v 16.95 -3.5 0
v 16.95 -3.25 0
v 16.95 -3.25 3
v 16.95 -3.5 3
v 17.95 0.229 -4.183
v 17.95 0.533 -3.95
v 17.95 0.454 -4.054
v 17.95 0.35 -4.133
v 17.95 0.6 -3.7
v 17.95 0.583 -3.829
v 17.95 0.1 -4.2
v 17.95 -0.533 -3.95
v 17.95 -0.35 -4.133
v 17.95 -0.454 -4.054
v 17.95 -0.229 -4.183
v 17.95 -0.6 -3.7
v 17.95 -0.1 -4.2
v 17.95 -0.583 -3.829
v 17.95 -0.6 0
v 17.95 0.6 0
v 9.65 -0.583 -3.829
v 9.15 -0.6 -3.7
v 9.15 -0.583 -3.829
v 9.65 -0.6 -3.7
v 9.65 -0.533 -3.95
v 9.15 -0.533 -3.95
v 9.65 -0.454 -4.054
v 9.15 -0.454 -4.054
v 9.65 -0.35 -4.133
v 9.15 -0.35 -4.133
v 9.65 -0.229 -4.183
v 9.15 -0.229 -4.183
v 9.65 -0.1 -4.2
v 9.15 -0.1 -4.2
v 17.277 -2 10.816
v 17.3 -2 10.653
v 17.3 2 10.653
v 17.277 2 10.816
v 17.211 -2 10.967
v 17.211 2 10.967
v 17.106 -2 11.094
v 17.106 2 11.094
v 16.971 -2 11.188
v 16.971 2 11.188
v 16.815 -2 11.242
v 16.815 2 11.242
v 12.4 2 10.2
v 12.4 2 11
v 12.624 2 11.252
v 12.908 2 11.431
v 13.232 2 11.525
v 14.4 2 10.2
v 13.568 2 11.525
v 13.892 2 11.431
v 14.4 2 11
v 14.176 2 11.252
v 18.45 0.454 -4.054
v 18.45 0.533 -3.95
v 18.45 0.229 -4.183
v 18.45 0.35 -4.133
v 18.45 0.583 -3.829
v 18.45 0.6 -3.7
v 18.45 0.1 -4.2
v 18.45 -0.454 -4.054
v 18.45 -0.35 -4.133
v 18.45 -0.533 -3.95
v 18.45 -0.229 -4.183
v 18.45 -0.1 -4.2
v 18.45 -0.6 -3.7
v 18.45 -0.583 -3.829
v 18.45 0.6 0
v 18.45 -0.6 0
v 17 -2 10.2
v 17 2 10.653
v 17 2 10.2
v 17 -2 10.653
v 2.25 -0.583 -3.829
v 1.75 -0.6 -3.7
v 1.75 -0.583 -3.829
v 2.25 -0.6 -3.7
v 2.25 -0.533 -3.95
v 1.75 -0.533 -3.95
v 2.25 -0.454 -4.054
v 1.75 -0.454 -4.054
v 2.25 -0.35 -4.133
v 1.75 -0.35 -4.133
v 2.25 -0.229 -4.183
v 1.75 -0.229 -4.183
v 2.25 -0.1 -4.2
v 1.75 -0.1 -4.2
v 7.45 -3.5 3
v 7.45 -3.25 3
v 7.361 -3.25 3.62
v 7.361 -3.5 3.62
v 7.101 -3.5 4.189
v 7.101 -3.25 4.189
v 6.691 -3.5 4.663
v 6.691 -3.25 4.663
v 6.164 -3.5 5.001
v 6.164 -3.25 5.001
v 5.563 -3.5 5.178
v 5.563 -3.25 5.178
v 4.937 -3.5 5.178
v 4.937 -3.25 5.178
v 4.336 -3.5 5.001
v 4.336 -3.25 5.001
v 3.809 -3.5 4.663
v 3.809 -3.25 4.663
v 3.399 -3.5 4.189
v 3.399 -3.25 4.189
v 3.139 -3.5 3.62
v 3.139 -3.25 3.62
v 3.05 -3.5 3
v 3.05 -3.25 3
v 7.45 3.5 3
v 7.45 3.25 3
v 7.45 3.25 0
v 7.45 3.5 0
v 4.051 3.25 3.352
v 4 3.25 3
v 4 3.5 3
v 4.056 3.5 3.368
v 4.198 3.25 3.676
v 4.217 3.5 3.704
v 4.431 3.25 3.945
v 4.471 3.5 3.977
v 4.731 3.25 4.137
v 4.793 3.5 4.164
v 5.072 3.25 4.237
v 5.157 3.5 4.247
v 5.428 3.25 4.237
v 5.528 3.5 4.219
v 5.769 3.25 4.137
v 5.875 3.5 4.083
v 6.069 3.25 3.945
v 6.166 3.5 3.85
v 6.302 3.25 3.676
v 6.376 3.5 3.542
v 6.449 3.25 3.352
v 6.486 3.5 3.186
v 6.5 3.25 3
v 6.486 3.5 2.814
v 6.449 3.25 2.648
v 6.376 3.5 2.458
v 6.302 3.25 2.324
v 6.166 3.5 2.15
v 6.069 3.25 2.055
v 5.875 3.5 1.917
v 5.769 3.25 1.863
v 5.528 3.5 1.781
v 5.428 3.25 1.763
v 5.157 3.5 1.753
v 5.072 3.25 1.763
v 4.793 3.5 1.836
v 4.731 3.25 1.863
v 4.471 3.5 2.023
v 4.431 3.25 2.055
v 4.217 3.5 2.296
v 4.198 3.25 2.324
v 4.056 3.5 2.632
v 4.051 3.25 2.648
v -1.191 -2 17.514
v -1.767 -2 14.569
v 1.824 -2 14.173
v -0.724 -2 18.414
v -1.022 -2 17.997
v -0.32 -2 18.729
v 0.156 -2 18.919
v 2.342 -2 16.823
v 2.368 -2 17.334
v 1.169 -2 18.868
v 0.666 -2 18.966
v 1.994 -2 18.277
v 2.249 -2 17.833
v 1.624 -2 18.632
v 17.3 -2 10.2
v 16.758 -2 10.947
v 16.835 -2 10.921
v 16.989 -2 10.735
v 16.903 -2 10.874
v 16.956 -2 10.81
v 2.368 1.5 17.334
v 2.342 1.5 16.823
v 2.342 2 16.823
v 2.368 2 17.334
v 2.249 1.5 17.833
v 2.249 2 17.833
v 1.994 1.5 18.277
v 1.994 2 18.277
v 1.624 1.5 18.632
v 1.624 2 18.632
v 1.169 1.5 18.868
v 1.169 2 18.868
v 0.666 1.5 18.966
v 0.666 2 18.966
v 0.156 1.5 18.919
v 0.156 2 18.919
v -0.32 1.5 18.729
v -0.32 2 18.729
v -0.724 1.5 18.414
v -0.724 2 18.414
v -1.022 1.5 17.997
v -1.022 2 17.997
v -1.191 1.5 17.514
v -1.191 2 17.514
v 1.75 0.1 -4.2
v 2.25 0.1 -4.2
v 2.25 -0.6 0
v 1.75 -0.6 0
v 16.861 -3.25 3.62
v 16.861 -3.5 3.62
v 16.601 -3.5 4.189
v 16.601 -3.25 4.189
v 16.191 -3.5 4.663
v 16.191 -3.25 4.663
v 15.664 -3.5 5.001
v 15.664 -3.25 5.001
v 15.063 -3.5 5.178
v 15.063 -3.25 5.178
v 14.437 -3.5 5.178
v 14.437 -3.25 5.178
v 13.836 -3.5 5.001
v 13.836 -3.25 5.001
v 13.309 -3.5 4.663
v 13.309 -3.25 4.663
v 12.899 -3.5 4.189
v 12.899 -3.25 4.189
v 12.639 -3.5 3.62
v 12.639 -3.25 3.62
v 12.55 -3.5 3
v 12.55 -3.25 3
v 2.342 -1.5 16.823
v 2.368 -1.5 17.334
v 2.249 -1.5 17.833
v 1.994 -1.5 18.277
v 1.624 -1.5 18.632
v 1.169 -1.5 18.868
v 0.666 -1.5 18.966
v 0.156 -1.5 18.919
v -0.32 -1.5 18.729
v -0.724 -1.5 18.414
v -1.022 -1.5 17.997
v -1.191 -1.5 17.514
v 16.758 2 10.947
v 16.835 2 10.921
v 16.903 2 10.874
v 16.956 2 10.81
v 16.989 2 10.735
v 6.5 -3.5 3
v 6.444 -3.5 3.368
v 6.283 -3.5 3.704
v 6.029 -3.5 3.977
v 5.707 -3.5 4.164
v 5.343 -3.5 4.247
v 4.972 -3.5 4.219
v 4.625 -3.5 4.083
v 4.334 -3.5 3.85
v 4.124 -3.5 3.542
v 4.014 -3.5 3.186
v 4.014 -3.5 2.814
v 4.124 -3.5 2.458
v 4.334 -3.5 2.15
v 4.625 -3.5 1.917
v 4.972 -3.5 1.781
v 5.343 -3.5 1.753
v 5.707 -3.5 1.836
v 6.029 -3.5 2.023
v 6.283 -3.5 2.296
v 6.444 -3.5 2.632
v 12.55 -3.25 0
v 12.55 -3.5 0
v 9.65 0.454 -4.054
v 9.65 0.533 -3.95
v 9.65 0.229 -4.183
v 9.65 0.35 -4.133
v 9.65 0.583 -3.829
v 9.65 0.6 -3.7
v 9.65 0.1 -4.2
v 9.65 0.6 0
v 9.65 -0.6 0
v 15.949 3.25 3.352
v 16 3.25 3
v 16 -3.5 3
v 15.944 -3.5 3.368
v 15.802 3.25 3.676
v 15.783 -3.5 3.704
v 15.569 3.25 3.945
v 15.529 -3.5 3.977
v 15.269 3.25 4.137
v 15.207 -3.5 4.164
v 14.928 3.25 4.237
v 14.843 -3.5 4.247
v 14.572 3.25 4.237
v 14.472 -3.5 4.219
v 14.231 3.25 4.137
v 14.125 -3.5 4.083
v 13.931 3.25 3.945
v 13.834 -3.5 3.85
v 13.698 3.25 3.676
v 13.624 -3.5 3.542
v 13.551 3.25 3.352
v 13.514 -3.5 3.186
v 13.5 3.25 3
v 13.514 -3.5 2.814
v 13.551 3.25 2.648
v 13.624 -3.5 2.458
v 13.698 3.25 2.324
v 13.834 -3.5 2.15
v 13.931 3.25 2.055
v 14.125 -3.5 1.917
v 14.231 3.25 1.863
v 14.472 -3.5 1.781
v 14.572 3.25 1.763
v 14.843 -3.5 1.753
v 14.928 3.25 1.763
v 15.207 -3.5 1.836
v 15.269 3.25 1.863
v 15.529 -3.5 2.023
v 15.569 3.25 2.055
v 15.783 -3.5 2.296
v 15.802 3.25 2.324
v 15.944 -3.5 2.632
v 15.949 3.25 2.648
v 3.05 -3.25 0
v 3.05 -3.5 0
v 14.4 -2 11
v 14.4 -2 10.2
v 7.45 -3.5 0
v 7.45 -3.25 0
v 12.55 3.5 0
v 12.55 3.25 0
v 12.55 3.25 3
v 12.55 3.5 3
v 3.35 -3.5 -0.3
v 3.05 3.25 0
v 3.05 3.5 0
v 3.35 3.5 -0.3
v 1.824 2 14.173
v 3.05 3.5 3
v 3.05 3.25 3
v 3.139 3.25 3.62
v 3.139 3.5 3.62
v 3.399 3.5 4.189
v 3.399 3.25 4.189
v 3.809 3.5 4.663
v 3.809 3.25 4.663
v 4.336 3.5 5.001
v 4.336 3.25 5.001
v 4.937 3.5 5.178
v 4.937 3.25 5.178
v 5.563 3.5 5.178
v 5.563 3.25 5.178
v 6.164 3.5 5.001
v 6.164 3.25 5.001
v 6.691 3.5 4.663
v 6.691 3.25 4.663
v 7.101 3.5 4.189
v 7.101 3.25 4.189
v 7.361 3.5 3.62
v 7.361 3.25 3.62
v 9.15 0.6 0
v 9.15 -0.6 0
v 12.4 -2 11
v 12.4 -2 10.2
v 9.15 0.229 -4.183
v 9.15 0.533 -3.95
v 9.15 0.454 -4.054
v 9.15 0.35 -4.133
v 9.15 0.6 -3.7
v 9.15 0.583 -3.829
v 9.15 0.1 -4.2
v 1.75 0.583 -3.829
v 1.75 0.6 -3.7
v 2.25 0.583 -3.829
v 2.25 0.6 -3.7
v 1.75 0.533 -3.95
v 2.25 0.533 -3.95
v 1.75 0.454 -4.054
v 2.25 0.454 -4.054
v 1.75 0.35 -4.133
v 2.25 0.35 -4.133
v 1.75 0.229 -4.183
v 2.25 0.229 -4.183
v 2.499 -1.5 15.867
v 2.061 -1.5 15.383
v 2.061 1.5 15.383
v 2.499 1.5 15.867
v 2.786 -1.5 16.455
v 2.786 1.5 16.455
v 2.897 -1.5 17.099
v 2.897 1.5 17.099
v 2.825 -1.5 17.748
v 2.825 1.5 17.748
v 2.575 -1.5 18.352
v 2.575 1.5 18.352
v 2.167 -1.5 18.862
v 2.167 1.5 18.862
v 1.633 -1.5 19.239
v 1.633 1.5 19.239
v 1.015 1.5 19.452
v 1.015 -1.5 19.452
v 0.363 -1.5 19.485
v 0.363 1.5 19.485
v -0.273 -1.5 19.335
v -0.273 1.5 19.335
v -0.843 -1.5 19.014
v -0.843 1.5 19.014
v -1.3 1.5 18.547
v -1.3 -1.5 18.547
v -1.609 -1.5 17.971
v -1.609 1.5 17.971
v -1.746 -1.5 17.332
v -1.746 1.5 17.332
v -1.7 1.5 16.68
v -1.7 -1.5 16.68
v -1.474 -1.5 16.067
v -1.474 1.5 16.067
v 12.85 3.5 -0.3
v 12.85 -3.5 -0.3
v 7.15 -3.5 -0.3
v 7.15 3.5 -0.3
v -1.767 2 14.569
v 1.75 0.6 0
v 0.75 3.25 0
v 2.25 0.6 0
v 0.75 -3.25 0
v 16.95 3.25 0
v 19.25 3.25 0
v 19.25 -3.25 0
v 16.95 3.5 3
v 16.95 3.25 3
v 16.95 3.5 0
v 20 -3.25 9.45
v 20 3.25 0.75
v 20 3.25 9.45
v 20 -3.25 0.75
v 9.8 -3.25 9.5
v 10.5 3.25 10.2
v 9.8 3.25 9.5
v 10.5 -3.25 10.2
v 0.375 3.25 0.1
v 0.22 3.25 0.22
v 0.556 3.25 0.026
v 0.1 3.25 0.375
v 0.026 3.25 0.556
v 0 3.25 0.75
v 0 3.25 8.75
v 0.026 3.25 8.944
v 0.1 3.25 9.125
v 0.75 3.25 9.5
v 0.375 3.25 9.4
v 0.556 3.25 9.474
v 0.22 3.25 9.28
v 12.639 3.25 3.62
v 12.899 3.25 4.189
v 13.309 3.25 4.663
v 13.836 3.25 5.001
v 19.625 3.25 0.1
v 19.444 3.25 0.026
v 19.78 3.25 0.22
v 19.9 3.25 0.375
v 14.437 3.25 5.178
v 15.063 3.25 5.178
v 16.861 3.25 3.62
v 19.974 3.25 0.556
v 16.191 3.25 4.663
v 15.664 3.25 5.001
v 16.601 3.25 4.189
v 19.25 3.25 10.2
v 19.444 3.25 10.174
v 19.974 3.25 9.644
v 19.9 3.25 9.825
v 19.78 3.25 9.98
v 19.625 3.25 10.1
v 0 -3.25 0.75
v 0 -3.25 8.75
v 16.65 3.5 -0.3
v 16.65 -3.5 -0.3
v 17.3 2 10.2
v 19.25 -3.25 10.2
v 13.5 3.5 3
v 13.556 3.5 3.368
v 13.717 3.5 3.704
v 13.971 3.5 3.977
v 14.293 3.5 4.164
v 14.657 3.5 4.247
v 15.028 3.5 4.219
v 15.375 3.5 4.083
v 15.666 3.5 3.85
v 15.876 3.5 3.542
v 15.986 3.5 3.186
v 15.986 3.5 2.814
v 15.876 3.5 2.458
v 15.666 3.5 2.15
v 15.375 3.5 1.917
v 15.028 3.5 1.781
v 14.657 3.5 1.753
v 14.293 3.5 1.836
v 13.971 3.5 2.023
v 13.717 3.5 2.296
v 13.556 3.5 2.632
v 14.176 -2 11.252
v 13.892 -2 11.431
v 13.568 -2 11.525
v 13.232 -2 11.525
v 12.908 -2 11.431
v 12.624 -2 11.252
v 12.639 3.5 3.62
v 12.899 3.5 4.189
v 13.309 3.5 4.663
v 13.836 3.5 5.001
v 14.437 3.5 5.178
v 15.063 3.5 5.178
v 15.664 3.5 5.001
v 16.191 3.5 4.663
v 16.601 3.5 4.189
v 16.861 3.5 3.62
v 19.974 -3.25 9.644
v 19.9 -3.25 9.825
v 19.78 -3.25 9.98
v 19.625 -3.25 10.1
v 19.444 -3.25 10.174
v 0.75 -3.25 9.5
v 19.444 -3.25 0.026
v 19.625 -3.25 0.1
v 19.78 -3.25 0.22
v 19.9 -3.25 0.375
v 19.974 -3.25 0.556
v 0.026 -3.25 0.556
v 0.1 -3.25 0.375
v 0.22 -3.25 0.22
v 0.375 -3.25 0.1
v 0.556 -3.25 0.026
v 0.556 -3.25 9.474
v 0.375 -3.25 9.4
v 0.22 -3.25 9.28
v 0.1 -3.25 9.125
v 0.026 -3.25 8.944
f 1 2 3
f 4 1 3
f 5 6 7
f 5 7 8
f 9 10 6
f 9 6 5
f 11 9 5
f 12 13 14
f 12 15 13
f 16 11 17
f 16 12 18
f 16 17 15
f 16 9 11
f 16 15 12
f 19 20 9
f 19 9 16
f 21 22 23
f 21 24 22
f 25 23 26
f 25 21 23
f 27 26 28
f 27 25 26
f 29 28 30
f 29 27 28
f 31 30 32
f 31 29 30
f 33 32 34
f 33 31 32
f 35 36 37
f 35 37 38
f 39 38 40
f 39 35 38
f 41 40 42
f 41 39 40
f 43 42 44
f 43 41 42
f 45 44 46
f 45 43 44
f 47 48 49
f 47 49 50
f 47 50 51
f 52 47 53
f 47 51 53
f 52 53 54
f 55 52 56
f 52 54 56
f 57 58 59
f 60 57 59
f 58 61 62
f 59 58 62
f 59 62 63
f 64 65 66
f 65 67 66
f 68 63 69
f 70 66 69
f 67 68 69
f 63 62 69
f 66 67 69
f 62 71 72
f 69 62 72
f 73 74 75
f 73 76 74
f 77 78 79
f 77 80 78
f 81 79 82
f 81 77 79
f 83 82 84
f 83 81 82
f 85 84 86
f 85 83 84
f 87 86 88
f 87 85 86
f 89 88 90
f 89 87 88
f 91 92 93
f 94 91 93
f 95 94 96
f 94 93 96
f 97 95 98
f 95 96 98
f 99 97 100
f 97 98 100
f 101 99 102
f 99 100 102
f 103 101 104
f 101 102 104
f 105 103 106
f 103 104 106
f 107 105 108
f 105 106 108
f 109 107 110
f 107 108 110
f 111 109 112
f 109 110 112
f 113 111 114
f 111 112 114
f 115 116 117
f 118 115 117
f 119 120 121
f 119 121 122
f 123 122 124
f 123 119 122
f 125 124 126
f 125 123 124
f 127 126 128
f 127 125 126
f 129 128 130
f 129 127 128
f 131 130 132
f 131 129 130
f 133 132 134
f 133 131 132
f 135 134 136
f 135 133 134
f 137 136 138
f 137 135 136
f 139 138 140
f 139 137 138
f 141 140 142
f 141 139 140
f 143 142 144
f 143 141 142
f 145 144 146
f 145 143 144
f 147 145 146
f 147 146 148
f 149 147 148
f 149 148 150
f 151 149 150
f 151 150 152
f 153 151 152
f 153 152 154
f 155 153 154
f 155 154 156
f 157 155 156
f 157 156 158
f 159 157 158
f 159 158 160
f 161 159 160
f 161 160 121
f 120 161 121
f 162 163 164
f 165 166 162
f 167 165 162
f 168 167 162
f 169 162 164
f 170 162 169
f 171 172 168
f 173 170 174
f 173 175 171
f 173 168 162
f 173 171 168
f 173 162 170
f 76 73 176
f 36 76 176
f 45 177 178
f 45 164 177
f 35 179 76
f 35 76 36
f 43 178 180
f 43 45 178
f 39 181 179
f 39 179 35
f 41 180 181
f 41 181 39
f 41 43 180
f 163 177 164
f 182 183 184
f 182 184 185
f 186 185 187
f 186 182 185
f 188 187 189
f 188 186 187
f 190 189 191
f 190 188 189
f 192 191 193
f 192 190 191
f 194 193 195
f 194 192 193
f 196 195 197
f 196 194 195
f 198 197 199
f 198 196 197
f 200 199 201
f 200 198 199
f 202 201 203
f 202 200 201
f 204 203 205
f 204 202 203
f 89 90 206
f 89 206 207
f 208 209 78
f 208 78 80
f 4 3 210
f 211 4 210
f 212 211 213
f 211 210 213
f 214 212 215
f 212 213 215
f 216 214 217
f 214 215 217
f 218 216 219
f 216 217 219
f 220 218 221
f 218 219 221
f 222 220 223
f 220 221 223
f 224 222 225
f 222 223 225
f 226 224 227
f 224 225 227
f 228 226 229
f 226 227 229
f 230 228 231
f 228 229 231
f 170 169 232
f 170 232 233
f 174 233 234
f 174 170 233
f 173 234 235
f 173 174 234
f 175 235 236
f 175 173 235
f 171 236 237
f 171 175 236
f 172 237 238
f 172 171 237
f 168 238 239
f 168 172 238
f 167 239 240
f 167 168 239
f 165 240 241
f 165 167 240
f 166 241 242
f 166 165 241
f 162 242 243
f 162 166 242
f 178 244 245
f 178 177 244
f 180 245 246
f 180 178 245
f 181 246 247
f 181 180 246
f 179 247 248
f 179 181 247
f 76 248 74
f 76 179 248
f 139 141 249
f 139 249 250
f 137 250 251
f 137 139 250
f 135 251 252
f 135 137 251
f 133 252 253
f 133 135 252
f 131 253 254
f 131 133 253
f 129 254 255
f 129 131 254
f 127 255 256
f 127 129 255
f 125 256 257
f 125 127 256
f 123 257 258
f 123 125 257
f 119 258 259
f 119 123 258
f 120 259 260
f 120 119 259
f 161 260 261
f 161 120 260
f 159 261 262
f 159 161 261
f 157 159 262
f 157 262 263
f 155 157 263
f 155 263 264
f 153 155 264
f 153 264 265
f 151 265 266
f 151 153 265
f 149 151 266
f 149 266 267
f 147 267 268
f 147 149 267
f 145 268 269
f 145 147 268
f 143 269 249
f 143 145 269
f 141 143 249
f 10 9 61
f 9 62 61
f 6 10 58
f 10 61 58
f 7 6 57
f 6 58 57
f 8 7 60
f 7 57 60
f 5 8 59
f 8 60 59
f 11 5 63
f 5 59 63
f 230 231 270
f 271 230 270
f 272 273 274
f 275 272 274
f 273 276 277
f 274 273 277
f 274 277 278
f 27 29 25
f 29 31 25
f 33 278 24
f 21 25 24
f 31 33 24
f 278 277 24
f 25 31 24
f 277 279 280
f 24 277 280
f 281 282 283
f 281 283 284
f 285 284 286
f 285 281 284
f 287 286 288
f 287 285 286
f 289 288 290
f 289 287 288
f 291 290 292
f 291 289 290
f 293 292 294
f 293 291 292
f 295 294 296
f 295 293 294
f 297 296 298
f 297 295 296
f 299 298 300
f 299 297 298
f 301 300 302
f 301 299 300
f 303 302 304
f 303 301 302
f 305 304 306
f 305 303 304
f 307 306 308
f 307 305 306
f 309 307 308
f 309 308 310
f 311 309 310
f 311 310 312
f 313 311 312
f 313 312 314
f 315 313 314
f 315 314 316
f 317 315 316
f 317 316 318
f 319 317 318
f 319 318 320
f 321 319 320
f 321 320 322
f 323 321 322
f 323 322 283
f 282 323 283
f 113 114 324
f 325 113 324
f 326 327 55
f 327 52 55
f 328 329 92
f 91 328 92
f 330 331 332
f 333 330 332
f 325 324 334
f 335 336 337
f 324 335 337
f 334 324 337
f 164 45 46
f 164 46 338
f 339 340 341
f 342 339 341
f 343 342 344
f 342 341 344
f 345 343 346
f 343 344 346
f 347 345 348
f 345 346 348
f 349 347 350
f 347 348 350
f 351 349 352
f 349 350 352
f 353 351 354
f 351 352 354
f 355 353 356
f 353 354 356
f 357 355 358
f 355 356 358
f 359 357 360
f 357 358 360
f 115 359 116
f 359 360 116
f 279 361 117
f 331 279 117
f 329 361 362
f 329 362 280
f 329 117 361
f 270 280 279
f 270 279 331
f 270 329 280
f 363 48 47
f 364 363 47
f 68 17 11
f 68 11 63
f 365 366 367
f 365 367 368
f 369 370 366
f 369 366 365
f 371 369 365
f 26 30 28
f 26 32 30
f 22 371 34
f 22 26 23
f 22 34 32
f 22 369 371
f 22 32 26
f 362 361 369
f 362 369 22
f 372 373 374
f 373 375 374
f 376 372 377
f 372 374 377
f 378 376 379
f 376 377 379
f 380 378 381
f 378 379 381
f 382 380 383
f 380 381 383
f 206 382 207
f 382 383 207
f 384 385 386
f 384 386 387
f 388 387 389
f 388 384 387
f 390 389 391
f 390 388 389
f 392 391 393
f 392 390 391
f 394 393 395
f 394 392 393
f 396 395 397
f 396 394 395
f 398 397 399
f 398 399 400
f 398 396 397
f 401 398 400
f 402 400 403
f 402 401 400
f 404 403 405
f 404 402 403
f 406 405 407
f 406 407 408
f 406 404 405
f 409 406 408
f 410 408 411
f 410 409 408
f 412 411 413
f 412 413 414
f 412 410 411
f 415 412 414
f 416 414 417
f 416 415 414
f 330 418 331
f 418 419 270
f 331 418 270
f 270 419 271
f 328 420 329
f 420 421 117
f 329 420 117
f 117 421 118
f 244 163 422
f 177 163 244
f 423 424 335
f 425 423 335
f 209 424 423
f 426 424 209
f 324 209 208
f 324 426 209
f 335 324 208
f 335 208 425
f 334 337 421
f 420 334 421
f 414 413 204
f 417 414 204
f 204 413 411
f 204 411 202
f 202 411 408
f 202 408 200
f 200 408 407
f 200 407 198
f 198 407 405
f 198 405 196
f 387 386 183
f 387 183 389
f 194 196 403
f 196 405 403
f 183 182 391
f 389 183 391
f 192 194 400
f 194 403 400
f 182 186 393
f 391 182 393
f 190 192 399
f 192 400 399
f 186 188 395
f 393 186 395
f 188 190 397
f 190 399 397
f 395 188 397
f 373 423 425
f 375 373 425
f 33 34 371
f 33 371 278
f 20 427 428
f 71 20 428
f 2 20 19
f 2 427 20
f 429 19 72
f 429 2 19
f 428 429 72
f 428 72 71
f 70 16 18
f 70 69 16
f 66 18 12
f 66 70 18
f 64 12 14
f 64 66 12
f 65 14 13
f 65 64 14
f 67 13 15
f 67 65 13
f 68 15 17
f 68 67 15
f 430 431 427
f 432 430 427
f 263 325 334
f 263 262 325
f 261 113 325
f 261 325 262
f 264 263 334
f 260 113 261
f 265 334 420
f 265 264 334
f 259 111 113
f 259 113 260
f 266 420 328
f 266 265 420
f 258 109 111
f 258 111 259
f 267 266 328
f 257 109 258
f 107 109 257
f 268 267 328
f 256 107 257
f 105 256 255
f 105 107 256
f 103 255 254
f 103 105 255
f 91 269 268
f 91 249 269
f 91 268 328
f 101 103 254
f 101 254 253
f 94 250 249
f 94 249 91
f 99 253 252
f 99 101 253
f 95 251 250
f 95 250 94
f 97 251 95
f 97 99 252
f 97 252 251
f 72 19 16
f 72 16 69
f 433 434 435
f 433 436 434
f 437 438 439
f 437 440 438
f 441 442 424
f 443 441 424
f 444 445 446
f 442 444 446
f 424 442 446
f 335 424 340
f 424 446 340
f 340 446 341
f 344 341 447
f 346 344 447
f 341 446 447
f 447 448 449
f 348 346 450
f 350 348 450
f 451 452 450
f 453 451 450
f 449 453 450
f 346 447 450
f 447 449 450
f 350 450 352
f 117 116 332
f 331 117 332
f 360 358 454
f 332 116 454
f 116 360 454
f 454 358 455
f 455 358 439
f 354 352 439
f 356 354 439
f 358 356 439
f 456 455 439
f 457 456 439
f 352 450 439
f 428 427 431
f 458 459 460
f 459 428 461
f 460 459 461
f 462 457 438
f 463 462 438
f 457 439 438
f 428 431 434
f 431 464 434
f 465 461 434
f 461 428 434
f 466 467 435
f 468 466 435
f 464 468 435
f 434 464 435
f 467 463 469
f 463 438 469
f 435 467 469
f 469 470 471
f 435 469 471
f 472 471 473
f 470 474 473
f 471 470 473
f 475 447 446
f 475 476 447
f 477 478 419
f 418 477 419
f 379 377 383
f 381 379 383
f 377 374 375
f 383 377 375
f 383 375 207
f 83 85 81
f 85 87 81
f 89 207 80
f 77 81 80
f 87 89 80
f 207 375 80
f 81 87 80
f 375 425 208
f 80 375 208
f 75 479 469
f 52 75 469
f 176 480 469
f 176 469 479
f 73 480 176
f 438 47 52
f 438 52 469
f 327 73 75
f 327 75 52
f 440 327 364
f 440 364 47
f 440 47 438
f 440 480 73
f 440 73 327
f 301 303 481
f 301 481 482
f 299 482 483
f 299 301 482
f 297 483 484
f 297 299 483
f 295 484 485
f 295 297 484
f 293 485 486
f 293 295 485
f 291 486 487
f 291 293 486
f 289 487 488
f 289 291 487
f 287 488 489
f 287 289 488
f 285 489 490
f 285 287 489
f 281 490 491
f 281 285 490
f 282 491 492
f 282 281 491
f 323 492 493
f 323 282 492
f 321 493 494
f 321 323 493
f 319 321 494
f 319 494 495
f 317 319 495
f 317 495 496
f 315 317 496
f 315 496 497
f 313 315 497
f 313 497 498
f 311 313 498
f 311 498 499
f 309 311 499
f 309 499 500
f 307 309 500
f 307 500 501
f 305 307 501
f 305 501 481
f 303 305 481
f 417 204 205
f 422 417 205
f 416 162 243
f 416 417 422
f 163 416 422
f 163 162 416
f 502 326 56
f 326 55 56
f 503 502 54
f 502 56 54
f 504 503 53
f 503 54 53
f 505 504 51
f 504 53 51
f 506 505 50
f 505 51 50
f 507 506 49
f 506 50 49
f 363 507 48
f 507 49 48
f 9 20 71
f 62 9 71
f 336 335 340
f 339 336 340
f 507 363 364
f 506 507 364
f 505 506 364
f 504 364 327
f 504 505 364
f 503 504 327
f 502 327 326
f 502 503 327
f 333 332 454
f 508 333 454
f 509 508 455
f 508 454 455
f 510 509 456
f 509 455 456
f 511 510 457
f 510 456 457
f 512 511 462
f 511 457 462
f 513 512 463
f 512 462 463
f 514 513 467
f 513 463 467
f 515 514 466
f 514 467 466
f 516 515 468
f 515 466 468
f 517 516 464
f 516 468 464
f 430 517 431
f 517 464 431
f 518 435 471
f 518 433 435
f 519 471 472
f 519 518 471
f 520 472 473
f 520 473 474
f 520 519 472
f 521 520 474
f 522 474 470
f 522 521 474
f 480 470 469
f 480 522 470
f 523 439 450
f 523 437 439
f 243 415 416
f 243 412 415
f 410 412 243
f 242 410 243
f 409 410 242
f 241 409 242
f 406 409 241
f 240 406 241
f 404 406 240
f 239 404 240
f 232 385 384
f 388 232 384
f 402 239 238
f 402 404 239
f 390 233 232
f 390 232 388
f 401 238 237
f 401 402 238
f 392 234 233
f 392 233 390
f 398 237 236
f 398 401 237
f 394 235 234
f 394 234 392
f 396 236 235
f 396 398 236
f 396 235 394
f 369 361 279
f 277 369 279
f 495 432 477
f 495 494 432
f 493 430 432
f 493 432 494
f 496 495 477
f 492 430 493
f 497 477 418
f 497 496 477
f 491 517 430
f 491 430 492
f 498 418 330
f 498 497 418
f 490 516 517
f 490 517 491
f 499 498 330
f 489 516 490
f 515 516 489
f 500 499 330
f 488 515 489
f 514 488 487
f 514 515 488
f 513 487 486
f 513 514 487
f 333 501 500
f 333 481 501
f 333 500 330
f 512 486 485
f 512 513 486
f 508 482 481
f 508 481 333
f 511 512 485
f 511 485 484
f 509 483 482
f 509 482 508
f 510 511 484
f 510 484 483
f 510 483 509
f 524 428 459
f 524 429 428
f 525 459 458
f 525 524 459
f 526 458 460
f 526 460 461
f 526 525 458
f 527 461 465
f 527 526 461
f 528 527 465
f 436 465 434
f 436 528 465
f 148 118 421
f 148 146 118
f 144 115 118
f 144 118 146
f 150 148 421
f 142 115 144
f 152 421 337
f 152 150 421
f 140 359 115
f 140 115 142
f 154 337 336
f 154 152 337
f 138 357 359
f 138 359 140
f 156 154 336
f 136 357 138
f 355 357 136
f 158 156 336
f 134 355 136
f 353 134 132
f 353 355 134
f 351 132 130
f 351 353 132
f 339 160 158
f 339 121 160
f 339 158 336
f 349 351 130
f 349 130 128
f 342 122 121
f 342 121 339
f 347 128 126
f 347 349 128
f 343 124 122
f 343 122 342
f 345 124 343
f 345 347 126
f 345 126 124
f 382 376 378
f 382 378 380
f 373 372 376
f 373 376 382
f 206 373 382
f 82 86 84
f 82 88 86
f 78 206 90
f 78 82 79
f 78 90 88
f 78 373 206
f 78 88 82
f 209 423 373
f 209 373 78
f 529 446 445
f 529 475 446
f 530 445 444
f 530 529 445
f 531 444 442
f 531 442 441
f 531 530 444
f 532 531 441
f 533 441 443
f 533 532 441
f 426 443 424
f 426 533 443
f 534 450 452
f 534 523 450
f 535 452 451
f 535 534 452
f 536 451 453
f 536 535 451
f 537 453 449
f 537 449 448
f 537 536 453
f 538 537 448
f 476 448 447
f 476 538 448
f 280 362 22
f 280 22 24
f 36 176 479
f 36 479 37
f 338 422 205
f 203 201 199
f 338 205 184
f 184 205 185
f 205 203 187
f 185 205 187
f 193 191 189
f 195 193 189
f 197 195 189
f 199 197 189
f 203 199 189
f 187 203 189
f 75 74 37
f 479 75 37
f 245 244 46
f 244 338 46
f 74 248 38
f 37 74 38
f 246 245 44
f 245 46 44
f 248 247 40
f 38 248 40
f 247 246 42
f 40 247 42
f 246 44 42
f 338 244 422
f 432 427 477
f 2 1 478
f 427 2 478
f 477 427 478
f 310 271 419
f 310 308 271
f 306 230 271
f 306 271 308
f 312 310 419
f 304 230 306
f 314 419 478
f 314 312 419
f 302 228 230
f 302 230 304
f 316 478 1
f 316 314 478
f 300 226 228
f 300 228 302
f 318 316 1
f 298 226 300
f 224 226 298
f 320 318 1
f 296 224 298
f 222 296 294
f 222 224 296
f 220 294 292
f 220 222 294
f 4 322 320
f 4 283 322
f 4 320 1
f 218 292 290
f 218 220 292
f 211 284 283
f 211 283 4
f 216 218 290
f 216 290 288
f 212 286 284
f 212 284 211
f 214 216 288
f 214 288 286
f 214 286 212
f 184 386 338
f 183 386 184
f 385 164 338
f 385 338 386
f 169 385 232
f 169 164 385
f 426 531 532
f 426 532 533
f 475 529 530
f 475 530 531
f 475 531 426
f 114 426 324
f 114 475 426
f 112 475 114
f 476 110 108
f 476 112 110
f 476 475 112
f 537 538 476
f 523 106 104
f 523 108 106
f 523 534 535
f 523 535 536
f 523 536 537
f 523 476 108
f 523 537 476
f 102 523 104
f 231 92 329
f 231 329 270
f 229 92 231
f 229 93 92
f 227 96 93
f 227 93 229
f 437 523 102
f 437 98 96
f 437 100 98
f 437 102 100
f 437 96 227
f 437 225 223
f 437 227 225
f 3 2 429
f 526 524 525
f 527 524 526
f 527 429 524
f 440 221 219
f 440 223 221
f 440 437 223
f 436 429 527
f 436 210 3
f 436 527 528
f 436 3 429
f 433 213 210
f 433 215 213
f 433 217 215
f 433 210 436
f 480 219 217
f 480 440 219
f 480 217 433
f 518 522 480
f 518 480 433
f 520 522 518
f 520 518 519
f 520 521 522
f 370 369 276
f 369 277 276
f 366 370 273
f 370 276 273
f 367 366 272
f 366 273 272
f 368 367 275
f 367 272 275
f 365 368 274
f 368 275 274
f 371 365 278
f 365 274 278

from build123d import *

# Parameters (mm, degrees)
F0_R      = 1.25
F1_DEPTH  = 3.25
F2_R      = 1.25
F3_DEPTH  = 0.25
F4_R      = 1.25
F5_DEPTH  = 0.25
F6_R      = 0.75
F7_DEPTH  = 2
F8_W      = 3.4
F8_H      = 6
F9_DEPTH  = 25
F10_R     = 0.75
F11_DEPTH = 4
F12_W     = 0.5
F12_H     = 1.2
F13_DEPTH = 4.2
F14_R     = 0.5
F15_R     = 2.325
F15_R_2   = 0.8
F16_DEPTH = 1.5


with BuildPart() as f1:
    # F0 (on Front) → F1 (new body, symmetric)
    with BuildSketch(Plane.XZ):
        with BuildLine():
            ThreePointArc((0, 0.75), (0.2196699141, 0.2196699141), (0.75, 0))
            Line((0.75, 0), (3.05, 0))
            Line((3.05, 0), (3.35, -0.3))
            Line((3.35, -0.3), (7.15, -0.3))
            Line((7.15, -0.3), (7.45, 0))
            Line((7.45, 0), (12.55, 0))
            Line((12.55, 0), (12.85, -0.3))
            Line((12.85, -0.3), (16.65, -0.3))
            Line((16.65, -0.3), (16.95, 0))
            Line((16.95, 0), (19.25, 0))
            ThreePointArc((19.25, 0), (19.7803300859, 0.2196699141), (20, 0.75))
            Line((20, 0.75), (20, 9.45))
            ThreePointArc((20, 9.45), (19.7803300859, 9.9803300859), (19.25, 10.2))
            Line((19.25, 10.2), (10.5, 10.2))
            Line((10.5, 10.2), (9.8, 9.5))
            Line((9.8, 9.5), (0.75, 9.5))
            ThreePointArc((0.75, 9.5), (0.2196699141, 9.2803300859), (0, 8.75))
            Line((0, 8.75), (0, 0.75))
        make_face()
        with Locations((5.25, 3)):
            Circle(F0_R, mode=Mode.SUBTRACT)
        with Locations((14.75, 3)):
            Circle(F0_R, mode=Mode.SUBTRACT)
    extrude(amount=F1_DEPTH, both=True)

    # F2 (on face) → F3 (join)
    with BuildSketch(Plane.XZ.offset(3.25)):
        with BuildLine():
            Line((7.45, 0), (7.45, 3))
            ThreePointArc((7.45, 3), (5.25, 5.2), (3.05, 3))
            Line((3.05, 3), (3.05, 0))
            Line((3.05, 0), (3.35, -0.3))
            Line((3.35, -0.3), (7.15, -0.3))
            Line((7.15, -0.3), (7.45, 0))
        make_face()
        with Locations((5.25, 3)):
            Circle(F2_R, mode=Mode.SUBTRACT)
        with BuildLine():
            Line((16.95, 0), (16.95, 3))
            ThreePointArc((16.95, 3), (14.75, 5.2), (12.55, 3))
            Line((12.55, 3), (12.55, 0))
            Line((12.55, 0), (12.85, -0.3))
            Line((12.85, -0.3), (16.65, -0.3))
            Line((16.65, -0.3), (16.95, 0))
        make_face()
        with Locations((14.75, 3)):
            Circle(F2_R, mode=Mode.SUBTRACT)
    extrude(amount=F3_DEPTH)

    # F4 (on face) → F5 (join)
    with BuildSketch(Plane(origin=(0, 3.25, 0), x_dir=(-1, 0, 0), z_dir=(0, 1, 0))):
        with BuildLine():
            Line((-12.55, 0), (-12.55, 3))
            ThreePointArc((-12.55, 3), (-14.75, 5.2), (-16.95, 3))
            Line((-16.95, 3), (-16.95, 0))
            Line((-16.95, 0), (-16.65, -0.3))
            Line((-16.65, -0.3), (-12.85, -0.3))
            Line((-12.85, -0.3), (-12.55, 0))
        make_face()
        with Locations((-14.75, 3)):
            Circle(F4_R, mode=Mode.SUBTRACT)
        with BuildLine():
            Line((-3.05, 0), (-3.05, 3))
            ThreePointArc((-3.05, 3), (-5.25, 5.2), (-7.45, 3))
            Line((-7.45, 3), (-7.45, 0))
            Line((-7.45, 0), (-7.15, -0.3))
            Line((-7.15, -0.3), (-3.35, -0.3))
            Line((-3.35, -0.3), (-3.05, 0))
        make_face()
        with Locations((-5.25, 3)):
            Circle(F4_R, mode=Mode.SUBTRACT)
    extrude(amount=F5_DEPTH)

    # F6 (on Front) → F7 (join, symmetric)
    with BuildSketch(Plane.XZ):
        with BuildLine():
            Line((12.4, 10.2), (14.4, 10.2))
            Line((14.4, 10.2), (14.4, 11))
            ThreePointArc((14.4, 11), (13.4, 11.5366750419), (12.4, 11))
            Line((12.4, 11), (12.4, 10.2))
        make_face()
        with BuildLine():
            Line((17, 10.6529764402), (17, 10.2))
            Line((17, 10.2), (17.3, 10.2))
            Line((17.3, 10.2), (17.3, 10.6529764402))
            ThreePointArc((17.3, 10.6529764402), (17.1631848578, 11.0343683482), (16.8151340416, 11.2418262958))
            Line((16.8151340416, 11.2418262958), (1.8241165877, 14.1729239433))
            Line((1.8241165877, 14.1729239433), (2.3422197747, 16.8227482936))
            ThreePointArc((2.3422197747, 16.8227482936), (0.9210723325, 18.9346999851), (-1.1908793591, 17.5135525429))
            Line((-1.1908793591, 17.5135525429), (-1.7665495669, 14.5693032648))
            Line((-1.7665495669, 14.5693032648), (16.7575670208, 10.947401368))
            ThreePointArc((16.7575670208, 10.947401368), (16.9315924289, 10.8436723942), (17, 10.6529764402))
        make_face()
        with Locations((0.5756702078, 17.1681504183)):
            Circle(F6_R, mode=Mode.SUBTRACT)
    extrude(amount=F7_DEPTH, both=True)

    # F8 (on face) → F9 (cut)
    with BuildSketch(Plane(origin=(-4.4452524635, 0, 0.8691517489), x_dir=(0, -1, 0), z_dir=(-0.981416426, 0, 0.1918900693))):
        with Locations((0, 17.2595702214)):
            Rectangle(F8_W, F8_H)
    extrude(amount=F9_DEPTH, mode=Mode.SUBTRACT)

    # F12 (on face) → F13 (join)
    with BuildSketch(Plane(origin=(0, 0, 0), x_dir=(1, 0, 0), z_dir=(0, 0, -1))):
        with Locations((18.2, 0)):
            Rectangle(F12_W, F12_H)
        with Locations((9.4, 0)):
            Rectangle(F12_W, F12_H)
        with Locations((2, 0)):
            Rectangle(F12_W, F12_H)
    extrude(amount=F13_DEPTH)

    # F14
    f14_edges = [f1.edges().sort_by_distance(p)[0] for p in [
        (2, -0.6, -4.2),
        (2, 0.6, -4.2),
        (9.4, 0.6, -4.2),
        (9.4, -0.6, -4.2),
        (18.2, -0.6, -4.2),
        (18.2, 0.6, -4.2),
    ]]
    fillet(f14_edges, radius=F14_R)



with BuildPart() as f11:
    # F10 (on face) → F11 (new body)
    with BuildSketch(Plane.XZ.offset(2)):
        with Locations((0.5756702078, 17.1681504183)):
            Circle(F10_R)
    extrude(amount=-F11_DEPTH)


with BuildPart() as f1_1:
    add(f1.part)

    add(f11.part)  # F16 merges F11
    # F15 (on Front) → F16 (join, symmetric)
    with BuildSketch(Plane.XZ):
        with Locations((0.5733088478, 17.1697099968)):
            Circle(F15_R)
        with Locations((0.5733088478, 17.1697099968)):
            Circle(F15_R_2, mode=Mode.SUBTRACT)
        with Locations((0.5733088478, 17.1697099968)):
            Circle(F15_R_2)
    extrude(amount=F16_DEPTH, both=True)


solid = f1_1.part
